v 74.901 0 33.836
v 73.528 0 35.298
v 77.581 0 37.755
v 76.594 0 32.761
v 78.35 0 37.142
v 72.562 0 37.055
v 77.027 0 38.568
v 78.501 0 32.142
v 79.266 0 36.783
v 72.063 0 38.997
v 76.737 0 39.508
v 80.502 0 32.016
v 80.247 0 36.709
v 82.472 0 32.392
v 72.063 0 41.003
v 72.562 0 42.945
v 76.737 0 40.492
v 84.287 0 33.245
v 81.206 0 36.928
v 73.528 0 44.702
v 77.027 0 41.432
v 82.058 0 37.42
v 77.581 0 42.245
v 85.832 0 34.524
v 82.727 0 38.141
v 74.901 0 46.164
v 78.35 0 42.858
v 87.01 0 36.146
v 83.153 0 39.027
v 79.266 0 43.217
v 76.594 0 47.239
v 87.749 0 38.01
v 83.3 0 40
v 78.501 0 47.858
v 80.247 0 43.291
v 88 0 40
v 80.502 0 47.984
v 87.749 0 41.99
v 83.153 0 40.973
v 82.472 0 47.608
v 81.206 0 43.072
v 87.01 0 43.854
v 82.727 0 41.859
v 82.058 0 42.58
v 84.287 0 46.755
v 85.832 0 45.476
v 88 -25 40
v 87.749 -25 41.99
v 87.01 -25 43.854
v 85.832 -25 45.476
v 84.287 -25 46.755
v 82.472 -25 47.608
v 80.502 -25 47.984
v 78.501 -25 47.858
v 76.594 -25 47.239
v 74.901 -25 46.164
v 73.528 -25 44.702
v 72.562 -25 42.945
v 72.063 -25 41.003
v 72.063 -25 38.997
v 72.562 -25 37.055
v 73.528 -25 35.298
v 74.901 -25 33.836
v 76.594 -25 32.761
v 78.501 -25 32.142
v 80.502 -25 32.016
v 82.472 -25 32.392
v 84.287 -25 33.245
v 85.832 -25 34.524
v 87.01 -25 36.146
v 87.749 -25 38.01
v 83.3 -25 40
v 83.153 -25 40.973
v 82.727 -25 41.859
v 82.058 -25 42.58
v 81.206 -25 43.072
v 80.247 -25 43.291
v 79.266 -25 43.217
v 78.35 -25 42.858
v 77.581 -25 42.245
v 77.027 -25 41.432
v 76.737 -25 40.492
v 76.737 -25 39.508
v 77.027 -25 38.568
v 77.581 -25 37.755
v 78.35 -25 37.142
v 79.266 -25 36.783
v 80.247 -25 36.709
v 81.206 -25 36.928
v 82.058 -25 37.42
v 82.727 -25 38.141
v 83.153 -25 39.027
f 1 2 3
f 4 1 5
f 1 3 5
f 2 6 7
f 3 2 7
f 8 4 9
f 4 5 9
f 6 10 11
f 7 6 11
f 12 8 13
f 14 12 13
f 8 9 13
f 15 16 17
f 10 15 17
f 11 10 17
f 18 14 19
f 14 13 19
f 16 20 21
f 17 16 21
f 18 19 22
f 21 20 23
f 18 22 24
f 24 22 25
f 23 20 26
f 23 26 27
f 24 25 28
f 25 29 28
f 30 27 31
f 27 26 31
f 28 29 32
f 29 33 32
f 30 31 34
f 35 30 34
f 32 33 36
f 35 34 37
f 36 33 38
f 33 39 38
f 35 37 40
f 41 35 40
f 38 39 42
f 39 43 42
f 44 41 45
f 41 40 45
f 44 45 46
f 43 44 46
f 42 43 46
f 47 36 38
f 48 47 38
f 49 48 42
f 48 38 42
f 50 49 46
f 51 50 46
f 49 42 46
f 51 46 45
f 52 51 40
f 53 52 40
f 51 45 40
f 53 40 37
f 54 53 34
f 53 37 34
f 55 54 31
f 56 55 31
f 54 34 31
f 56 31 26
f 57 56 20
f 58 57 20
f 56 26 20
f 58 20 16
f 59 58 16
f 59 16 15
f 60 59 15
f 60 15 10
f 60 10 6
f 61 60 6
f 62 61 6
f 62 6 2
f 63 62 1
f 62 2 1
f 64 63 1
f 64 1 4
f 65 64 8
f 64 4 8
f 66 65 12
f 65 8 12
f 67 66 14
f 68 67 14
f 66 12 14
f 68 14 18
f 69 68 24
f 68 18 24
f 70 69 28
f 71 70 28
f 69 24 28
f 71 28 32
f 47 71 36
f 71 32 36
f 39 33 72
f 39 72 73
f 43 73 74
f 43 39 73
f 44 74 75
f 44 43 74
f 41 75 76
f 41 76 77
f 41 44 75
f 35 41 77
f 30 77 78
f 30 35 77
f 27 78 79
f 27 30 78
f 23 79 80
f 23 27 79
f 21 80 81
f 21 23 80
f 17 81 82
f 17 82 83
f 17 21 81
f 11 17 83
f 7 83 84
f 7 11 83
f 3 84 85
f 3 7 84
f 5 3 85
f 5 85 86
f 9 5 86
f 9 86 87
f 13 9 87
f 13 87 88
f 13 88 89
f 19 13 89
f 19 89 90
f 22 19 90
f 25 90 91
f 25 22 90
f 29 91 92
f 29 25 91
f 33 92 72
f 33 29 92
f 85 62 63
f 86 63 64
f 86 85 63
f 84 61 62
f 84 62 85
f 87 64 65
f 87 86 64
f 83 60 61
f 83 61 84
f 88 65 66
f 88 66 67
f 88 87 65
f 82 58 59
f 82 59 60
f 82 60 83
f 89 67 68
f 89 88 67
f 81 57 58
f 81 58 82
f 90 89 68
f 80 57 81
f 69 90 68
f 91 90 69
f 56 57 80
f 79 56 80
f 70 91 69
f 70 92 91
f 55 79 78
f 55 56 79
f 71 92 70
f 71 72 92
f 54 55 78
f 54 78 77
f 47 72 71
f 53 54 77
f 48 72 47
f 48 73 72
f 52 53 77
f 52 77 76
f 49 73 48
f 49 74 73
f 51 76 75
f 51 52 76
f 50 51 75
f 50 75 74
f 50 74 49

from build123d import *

# Parameters (mm, degrees)
CYLINDER011_R     = 3.3
CYLINDER011_DEPTH = 25
CYLINDER009_R     = 8
CYLINDER009_DEPTH = 25


with BuildPart() as zylinder011:
    # Cylinder011 → Cylinder011 (new body)
    with BuildSketch(Plane(origin=(80, 0, 40), x_dir=(1, 0, 0), z_dir=(0, -1, 0))):
        Circle(CYLINDER011_R)
    extrude(amount=CYLINDER011_DEPTH)


with BuildPart() as spacer01:
    # Cylinder009 → Cylinder009 (new body)
    with BuildSketch(Plane(origin=(80, 0, 40), x_dir=(1, 0, 0), z_dir=(0, -1, 0))):
        Circle(CYLINDER009_R)
    extrude(amount=CYLINDER009_DEPTH)

    # Cut006: cut Zylinder011
    add(zylinder011.part, mode=Mode.SUBTRACT)


solid = spacer01.part
